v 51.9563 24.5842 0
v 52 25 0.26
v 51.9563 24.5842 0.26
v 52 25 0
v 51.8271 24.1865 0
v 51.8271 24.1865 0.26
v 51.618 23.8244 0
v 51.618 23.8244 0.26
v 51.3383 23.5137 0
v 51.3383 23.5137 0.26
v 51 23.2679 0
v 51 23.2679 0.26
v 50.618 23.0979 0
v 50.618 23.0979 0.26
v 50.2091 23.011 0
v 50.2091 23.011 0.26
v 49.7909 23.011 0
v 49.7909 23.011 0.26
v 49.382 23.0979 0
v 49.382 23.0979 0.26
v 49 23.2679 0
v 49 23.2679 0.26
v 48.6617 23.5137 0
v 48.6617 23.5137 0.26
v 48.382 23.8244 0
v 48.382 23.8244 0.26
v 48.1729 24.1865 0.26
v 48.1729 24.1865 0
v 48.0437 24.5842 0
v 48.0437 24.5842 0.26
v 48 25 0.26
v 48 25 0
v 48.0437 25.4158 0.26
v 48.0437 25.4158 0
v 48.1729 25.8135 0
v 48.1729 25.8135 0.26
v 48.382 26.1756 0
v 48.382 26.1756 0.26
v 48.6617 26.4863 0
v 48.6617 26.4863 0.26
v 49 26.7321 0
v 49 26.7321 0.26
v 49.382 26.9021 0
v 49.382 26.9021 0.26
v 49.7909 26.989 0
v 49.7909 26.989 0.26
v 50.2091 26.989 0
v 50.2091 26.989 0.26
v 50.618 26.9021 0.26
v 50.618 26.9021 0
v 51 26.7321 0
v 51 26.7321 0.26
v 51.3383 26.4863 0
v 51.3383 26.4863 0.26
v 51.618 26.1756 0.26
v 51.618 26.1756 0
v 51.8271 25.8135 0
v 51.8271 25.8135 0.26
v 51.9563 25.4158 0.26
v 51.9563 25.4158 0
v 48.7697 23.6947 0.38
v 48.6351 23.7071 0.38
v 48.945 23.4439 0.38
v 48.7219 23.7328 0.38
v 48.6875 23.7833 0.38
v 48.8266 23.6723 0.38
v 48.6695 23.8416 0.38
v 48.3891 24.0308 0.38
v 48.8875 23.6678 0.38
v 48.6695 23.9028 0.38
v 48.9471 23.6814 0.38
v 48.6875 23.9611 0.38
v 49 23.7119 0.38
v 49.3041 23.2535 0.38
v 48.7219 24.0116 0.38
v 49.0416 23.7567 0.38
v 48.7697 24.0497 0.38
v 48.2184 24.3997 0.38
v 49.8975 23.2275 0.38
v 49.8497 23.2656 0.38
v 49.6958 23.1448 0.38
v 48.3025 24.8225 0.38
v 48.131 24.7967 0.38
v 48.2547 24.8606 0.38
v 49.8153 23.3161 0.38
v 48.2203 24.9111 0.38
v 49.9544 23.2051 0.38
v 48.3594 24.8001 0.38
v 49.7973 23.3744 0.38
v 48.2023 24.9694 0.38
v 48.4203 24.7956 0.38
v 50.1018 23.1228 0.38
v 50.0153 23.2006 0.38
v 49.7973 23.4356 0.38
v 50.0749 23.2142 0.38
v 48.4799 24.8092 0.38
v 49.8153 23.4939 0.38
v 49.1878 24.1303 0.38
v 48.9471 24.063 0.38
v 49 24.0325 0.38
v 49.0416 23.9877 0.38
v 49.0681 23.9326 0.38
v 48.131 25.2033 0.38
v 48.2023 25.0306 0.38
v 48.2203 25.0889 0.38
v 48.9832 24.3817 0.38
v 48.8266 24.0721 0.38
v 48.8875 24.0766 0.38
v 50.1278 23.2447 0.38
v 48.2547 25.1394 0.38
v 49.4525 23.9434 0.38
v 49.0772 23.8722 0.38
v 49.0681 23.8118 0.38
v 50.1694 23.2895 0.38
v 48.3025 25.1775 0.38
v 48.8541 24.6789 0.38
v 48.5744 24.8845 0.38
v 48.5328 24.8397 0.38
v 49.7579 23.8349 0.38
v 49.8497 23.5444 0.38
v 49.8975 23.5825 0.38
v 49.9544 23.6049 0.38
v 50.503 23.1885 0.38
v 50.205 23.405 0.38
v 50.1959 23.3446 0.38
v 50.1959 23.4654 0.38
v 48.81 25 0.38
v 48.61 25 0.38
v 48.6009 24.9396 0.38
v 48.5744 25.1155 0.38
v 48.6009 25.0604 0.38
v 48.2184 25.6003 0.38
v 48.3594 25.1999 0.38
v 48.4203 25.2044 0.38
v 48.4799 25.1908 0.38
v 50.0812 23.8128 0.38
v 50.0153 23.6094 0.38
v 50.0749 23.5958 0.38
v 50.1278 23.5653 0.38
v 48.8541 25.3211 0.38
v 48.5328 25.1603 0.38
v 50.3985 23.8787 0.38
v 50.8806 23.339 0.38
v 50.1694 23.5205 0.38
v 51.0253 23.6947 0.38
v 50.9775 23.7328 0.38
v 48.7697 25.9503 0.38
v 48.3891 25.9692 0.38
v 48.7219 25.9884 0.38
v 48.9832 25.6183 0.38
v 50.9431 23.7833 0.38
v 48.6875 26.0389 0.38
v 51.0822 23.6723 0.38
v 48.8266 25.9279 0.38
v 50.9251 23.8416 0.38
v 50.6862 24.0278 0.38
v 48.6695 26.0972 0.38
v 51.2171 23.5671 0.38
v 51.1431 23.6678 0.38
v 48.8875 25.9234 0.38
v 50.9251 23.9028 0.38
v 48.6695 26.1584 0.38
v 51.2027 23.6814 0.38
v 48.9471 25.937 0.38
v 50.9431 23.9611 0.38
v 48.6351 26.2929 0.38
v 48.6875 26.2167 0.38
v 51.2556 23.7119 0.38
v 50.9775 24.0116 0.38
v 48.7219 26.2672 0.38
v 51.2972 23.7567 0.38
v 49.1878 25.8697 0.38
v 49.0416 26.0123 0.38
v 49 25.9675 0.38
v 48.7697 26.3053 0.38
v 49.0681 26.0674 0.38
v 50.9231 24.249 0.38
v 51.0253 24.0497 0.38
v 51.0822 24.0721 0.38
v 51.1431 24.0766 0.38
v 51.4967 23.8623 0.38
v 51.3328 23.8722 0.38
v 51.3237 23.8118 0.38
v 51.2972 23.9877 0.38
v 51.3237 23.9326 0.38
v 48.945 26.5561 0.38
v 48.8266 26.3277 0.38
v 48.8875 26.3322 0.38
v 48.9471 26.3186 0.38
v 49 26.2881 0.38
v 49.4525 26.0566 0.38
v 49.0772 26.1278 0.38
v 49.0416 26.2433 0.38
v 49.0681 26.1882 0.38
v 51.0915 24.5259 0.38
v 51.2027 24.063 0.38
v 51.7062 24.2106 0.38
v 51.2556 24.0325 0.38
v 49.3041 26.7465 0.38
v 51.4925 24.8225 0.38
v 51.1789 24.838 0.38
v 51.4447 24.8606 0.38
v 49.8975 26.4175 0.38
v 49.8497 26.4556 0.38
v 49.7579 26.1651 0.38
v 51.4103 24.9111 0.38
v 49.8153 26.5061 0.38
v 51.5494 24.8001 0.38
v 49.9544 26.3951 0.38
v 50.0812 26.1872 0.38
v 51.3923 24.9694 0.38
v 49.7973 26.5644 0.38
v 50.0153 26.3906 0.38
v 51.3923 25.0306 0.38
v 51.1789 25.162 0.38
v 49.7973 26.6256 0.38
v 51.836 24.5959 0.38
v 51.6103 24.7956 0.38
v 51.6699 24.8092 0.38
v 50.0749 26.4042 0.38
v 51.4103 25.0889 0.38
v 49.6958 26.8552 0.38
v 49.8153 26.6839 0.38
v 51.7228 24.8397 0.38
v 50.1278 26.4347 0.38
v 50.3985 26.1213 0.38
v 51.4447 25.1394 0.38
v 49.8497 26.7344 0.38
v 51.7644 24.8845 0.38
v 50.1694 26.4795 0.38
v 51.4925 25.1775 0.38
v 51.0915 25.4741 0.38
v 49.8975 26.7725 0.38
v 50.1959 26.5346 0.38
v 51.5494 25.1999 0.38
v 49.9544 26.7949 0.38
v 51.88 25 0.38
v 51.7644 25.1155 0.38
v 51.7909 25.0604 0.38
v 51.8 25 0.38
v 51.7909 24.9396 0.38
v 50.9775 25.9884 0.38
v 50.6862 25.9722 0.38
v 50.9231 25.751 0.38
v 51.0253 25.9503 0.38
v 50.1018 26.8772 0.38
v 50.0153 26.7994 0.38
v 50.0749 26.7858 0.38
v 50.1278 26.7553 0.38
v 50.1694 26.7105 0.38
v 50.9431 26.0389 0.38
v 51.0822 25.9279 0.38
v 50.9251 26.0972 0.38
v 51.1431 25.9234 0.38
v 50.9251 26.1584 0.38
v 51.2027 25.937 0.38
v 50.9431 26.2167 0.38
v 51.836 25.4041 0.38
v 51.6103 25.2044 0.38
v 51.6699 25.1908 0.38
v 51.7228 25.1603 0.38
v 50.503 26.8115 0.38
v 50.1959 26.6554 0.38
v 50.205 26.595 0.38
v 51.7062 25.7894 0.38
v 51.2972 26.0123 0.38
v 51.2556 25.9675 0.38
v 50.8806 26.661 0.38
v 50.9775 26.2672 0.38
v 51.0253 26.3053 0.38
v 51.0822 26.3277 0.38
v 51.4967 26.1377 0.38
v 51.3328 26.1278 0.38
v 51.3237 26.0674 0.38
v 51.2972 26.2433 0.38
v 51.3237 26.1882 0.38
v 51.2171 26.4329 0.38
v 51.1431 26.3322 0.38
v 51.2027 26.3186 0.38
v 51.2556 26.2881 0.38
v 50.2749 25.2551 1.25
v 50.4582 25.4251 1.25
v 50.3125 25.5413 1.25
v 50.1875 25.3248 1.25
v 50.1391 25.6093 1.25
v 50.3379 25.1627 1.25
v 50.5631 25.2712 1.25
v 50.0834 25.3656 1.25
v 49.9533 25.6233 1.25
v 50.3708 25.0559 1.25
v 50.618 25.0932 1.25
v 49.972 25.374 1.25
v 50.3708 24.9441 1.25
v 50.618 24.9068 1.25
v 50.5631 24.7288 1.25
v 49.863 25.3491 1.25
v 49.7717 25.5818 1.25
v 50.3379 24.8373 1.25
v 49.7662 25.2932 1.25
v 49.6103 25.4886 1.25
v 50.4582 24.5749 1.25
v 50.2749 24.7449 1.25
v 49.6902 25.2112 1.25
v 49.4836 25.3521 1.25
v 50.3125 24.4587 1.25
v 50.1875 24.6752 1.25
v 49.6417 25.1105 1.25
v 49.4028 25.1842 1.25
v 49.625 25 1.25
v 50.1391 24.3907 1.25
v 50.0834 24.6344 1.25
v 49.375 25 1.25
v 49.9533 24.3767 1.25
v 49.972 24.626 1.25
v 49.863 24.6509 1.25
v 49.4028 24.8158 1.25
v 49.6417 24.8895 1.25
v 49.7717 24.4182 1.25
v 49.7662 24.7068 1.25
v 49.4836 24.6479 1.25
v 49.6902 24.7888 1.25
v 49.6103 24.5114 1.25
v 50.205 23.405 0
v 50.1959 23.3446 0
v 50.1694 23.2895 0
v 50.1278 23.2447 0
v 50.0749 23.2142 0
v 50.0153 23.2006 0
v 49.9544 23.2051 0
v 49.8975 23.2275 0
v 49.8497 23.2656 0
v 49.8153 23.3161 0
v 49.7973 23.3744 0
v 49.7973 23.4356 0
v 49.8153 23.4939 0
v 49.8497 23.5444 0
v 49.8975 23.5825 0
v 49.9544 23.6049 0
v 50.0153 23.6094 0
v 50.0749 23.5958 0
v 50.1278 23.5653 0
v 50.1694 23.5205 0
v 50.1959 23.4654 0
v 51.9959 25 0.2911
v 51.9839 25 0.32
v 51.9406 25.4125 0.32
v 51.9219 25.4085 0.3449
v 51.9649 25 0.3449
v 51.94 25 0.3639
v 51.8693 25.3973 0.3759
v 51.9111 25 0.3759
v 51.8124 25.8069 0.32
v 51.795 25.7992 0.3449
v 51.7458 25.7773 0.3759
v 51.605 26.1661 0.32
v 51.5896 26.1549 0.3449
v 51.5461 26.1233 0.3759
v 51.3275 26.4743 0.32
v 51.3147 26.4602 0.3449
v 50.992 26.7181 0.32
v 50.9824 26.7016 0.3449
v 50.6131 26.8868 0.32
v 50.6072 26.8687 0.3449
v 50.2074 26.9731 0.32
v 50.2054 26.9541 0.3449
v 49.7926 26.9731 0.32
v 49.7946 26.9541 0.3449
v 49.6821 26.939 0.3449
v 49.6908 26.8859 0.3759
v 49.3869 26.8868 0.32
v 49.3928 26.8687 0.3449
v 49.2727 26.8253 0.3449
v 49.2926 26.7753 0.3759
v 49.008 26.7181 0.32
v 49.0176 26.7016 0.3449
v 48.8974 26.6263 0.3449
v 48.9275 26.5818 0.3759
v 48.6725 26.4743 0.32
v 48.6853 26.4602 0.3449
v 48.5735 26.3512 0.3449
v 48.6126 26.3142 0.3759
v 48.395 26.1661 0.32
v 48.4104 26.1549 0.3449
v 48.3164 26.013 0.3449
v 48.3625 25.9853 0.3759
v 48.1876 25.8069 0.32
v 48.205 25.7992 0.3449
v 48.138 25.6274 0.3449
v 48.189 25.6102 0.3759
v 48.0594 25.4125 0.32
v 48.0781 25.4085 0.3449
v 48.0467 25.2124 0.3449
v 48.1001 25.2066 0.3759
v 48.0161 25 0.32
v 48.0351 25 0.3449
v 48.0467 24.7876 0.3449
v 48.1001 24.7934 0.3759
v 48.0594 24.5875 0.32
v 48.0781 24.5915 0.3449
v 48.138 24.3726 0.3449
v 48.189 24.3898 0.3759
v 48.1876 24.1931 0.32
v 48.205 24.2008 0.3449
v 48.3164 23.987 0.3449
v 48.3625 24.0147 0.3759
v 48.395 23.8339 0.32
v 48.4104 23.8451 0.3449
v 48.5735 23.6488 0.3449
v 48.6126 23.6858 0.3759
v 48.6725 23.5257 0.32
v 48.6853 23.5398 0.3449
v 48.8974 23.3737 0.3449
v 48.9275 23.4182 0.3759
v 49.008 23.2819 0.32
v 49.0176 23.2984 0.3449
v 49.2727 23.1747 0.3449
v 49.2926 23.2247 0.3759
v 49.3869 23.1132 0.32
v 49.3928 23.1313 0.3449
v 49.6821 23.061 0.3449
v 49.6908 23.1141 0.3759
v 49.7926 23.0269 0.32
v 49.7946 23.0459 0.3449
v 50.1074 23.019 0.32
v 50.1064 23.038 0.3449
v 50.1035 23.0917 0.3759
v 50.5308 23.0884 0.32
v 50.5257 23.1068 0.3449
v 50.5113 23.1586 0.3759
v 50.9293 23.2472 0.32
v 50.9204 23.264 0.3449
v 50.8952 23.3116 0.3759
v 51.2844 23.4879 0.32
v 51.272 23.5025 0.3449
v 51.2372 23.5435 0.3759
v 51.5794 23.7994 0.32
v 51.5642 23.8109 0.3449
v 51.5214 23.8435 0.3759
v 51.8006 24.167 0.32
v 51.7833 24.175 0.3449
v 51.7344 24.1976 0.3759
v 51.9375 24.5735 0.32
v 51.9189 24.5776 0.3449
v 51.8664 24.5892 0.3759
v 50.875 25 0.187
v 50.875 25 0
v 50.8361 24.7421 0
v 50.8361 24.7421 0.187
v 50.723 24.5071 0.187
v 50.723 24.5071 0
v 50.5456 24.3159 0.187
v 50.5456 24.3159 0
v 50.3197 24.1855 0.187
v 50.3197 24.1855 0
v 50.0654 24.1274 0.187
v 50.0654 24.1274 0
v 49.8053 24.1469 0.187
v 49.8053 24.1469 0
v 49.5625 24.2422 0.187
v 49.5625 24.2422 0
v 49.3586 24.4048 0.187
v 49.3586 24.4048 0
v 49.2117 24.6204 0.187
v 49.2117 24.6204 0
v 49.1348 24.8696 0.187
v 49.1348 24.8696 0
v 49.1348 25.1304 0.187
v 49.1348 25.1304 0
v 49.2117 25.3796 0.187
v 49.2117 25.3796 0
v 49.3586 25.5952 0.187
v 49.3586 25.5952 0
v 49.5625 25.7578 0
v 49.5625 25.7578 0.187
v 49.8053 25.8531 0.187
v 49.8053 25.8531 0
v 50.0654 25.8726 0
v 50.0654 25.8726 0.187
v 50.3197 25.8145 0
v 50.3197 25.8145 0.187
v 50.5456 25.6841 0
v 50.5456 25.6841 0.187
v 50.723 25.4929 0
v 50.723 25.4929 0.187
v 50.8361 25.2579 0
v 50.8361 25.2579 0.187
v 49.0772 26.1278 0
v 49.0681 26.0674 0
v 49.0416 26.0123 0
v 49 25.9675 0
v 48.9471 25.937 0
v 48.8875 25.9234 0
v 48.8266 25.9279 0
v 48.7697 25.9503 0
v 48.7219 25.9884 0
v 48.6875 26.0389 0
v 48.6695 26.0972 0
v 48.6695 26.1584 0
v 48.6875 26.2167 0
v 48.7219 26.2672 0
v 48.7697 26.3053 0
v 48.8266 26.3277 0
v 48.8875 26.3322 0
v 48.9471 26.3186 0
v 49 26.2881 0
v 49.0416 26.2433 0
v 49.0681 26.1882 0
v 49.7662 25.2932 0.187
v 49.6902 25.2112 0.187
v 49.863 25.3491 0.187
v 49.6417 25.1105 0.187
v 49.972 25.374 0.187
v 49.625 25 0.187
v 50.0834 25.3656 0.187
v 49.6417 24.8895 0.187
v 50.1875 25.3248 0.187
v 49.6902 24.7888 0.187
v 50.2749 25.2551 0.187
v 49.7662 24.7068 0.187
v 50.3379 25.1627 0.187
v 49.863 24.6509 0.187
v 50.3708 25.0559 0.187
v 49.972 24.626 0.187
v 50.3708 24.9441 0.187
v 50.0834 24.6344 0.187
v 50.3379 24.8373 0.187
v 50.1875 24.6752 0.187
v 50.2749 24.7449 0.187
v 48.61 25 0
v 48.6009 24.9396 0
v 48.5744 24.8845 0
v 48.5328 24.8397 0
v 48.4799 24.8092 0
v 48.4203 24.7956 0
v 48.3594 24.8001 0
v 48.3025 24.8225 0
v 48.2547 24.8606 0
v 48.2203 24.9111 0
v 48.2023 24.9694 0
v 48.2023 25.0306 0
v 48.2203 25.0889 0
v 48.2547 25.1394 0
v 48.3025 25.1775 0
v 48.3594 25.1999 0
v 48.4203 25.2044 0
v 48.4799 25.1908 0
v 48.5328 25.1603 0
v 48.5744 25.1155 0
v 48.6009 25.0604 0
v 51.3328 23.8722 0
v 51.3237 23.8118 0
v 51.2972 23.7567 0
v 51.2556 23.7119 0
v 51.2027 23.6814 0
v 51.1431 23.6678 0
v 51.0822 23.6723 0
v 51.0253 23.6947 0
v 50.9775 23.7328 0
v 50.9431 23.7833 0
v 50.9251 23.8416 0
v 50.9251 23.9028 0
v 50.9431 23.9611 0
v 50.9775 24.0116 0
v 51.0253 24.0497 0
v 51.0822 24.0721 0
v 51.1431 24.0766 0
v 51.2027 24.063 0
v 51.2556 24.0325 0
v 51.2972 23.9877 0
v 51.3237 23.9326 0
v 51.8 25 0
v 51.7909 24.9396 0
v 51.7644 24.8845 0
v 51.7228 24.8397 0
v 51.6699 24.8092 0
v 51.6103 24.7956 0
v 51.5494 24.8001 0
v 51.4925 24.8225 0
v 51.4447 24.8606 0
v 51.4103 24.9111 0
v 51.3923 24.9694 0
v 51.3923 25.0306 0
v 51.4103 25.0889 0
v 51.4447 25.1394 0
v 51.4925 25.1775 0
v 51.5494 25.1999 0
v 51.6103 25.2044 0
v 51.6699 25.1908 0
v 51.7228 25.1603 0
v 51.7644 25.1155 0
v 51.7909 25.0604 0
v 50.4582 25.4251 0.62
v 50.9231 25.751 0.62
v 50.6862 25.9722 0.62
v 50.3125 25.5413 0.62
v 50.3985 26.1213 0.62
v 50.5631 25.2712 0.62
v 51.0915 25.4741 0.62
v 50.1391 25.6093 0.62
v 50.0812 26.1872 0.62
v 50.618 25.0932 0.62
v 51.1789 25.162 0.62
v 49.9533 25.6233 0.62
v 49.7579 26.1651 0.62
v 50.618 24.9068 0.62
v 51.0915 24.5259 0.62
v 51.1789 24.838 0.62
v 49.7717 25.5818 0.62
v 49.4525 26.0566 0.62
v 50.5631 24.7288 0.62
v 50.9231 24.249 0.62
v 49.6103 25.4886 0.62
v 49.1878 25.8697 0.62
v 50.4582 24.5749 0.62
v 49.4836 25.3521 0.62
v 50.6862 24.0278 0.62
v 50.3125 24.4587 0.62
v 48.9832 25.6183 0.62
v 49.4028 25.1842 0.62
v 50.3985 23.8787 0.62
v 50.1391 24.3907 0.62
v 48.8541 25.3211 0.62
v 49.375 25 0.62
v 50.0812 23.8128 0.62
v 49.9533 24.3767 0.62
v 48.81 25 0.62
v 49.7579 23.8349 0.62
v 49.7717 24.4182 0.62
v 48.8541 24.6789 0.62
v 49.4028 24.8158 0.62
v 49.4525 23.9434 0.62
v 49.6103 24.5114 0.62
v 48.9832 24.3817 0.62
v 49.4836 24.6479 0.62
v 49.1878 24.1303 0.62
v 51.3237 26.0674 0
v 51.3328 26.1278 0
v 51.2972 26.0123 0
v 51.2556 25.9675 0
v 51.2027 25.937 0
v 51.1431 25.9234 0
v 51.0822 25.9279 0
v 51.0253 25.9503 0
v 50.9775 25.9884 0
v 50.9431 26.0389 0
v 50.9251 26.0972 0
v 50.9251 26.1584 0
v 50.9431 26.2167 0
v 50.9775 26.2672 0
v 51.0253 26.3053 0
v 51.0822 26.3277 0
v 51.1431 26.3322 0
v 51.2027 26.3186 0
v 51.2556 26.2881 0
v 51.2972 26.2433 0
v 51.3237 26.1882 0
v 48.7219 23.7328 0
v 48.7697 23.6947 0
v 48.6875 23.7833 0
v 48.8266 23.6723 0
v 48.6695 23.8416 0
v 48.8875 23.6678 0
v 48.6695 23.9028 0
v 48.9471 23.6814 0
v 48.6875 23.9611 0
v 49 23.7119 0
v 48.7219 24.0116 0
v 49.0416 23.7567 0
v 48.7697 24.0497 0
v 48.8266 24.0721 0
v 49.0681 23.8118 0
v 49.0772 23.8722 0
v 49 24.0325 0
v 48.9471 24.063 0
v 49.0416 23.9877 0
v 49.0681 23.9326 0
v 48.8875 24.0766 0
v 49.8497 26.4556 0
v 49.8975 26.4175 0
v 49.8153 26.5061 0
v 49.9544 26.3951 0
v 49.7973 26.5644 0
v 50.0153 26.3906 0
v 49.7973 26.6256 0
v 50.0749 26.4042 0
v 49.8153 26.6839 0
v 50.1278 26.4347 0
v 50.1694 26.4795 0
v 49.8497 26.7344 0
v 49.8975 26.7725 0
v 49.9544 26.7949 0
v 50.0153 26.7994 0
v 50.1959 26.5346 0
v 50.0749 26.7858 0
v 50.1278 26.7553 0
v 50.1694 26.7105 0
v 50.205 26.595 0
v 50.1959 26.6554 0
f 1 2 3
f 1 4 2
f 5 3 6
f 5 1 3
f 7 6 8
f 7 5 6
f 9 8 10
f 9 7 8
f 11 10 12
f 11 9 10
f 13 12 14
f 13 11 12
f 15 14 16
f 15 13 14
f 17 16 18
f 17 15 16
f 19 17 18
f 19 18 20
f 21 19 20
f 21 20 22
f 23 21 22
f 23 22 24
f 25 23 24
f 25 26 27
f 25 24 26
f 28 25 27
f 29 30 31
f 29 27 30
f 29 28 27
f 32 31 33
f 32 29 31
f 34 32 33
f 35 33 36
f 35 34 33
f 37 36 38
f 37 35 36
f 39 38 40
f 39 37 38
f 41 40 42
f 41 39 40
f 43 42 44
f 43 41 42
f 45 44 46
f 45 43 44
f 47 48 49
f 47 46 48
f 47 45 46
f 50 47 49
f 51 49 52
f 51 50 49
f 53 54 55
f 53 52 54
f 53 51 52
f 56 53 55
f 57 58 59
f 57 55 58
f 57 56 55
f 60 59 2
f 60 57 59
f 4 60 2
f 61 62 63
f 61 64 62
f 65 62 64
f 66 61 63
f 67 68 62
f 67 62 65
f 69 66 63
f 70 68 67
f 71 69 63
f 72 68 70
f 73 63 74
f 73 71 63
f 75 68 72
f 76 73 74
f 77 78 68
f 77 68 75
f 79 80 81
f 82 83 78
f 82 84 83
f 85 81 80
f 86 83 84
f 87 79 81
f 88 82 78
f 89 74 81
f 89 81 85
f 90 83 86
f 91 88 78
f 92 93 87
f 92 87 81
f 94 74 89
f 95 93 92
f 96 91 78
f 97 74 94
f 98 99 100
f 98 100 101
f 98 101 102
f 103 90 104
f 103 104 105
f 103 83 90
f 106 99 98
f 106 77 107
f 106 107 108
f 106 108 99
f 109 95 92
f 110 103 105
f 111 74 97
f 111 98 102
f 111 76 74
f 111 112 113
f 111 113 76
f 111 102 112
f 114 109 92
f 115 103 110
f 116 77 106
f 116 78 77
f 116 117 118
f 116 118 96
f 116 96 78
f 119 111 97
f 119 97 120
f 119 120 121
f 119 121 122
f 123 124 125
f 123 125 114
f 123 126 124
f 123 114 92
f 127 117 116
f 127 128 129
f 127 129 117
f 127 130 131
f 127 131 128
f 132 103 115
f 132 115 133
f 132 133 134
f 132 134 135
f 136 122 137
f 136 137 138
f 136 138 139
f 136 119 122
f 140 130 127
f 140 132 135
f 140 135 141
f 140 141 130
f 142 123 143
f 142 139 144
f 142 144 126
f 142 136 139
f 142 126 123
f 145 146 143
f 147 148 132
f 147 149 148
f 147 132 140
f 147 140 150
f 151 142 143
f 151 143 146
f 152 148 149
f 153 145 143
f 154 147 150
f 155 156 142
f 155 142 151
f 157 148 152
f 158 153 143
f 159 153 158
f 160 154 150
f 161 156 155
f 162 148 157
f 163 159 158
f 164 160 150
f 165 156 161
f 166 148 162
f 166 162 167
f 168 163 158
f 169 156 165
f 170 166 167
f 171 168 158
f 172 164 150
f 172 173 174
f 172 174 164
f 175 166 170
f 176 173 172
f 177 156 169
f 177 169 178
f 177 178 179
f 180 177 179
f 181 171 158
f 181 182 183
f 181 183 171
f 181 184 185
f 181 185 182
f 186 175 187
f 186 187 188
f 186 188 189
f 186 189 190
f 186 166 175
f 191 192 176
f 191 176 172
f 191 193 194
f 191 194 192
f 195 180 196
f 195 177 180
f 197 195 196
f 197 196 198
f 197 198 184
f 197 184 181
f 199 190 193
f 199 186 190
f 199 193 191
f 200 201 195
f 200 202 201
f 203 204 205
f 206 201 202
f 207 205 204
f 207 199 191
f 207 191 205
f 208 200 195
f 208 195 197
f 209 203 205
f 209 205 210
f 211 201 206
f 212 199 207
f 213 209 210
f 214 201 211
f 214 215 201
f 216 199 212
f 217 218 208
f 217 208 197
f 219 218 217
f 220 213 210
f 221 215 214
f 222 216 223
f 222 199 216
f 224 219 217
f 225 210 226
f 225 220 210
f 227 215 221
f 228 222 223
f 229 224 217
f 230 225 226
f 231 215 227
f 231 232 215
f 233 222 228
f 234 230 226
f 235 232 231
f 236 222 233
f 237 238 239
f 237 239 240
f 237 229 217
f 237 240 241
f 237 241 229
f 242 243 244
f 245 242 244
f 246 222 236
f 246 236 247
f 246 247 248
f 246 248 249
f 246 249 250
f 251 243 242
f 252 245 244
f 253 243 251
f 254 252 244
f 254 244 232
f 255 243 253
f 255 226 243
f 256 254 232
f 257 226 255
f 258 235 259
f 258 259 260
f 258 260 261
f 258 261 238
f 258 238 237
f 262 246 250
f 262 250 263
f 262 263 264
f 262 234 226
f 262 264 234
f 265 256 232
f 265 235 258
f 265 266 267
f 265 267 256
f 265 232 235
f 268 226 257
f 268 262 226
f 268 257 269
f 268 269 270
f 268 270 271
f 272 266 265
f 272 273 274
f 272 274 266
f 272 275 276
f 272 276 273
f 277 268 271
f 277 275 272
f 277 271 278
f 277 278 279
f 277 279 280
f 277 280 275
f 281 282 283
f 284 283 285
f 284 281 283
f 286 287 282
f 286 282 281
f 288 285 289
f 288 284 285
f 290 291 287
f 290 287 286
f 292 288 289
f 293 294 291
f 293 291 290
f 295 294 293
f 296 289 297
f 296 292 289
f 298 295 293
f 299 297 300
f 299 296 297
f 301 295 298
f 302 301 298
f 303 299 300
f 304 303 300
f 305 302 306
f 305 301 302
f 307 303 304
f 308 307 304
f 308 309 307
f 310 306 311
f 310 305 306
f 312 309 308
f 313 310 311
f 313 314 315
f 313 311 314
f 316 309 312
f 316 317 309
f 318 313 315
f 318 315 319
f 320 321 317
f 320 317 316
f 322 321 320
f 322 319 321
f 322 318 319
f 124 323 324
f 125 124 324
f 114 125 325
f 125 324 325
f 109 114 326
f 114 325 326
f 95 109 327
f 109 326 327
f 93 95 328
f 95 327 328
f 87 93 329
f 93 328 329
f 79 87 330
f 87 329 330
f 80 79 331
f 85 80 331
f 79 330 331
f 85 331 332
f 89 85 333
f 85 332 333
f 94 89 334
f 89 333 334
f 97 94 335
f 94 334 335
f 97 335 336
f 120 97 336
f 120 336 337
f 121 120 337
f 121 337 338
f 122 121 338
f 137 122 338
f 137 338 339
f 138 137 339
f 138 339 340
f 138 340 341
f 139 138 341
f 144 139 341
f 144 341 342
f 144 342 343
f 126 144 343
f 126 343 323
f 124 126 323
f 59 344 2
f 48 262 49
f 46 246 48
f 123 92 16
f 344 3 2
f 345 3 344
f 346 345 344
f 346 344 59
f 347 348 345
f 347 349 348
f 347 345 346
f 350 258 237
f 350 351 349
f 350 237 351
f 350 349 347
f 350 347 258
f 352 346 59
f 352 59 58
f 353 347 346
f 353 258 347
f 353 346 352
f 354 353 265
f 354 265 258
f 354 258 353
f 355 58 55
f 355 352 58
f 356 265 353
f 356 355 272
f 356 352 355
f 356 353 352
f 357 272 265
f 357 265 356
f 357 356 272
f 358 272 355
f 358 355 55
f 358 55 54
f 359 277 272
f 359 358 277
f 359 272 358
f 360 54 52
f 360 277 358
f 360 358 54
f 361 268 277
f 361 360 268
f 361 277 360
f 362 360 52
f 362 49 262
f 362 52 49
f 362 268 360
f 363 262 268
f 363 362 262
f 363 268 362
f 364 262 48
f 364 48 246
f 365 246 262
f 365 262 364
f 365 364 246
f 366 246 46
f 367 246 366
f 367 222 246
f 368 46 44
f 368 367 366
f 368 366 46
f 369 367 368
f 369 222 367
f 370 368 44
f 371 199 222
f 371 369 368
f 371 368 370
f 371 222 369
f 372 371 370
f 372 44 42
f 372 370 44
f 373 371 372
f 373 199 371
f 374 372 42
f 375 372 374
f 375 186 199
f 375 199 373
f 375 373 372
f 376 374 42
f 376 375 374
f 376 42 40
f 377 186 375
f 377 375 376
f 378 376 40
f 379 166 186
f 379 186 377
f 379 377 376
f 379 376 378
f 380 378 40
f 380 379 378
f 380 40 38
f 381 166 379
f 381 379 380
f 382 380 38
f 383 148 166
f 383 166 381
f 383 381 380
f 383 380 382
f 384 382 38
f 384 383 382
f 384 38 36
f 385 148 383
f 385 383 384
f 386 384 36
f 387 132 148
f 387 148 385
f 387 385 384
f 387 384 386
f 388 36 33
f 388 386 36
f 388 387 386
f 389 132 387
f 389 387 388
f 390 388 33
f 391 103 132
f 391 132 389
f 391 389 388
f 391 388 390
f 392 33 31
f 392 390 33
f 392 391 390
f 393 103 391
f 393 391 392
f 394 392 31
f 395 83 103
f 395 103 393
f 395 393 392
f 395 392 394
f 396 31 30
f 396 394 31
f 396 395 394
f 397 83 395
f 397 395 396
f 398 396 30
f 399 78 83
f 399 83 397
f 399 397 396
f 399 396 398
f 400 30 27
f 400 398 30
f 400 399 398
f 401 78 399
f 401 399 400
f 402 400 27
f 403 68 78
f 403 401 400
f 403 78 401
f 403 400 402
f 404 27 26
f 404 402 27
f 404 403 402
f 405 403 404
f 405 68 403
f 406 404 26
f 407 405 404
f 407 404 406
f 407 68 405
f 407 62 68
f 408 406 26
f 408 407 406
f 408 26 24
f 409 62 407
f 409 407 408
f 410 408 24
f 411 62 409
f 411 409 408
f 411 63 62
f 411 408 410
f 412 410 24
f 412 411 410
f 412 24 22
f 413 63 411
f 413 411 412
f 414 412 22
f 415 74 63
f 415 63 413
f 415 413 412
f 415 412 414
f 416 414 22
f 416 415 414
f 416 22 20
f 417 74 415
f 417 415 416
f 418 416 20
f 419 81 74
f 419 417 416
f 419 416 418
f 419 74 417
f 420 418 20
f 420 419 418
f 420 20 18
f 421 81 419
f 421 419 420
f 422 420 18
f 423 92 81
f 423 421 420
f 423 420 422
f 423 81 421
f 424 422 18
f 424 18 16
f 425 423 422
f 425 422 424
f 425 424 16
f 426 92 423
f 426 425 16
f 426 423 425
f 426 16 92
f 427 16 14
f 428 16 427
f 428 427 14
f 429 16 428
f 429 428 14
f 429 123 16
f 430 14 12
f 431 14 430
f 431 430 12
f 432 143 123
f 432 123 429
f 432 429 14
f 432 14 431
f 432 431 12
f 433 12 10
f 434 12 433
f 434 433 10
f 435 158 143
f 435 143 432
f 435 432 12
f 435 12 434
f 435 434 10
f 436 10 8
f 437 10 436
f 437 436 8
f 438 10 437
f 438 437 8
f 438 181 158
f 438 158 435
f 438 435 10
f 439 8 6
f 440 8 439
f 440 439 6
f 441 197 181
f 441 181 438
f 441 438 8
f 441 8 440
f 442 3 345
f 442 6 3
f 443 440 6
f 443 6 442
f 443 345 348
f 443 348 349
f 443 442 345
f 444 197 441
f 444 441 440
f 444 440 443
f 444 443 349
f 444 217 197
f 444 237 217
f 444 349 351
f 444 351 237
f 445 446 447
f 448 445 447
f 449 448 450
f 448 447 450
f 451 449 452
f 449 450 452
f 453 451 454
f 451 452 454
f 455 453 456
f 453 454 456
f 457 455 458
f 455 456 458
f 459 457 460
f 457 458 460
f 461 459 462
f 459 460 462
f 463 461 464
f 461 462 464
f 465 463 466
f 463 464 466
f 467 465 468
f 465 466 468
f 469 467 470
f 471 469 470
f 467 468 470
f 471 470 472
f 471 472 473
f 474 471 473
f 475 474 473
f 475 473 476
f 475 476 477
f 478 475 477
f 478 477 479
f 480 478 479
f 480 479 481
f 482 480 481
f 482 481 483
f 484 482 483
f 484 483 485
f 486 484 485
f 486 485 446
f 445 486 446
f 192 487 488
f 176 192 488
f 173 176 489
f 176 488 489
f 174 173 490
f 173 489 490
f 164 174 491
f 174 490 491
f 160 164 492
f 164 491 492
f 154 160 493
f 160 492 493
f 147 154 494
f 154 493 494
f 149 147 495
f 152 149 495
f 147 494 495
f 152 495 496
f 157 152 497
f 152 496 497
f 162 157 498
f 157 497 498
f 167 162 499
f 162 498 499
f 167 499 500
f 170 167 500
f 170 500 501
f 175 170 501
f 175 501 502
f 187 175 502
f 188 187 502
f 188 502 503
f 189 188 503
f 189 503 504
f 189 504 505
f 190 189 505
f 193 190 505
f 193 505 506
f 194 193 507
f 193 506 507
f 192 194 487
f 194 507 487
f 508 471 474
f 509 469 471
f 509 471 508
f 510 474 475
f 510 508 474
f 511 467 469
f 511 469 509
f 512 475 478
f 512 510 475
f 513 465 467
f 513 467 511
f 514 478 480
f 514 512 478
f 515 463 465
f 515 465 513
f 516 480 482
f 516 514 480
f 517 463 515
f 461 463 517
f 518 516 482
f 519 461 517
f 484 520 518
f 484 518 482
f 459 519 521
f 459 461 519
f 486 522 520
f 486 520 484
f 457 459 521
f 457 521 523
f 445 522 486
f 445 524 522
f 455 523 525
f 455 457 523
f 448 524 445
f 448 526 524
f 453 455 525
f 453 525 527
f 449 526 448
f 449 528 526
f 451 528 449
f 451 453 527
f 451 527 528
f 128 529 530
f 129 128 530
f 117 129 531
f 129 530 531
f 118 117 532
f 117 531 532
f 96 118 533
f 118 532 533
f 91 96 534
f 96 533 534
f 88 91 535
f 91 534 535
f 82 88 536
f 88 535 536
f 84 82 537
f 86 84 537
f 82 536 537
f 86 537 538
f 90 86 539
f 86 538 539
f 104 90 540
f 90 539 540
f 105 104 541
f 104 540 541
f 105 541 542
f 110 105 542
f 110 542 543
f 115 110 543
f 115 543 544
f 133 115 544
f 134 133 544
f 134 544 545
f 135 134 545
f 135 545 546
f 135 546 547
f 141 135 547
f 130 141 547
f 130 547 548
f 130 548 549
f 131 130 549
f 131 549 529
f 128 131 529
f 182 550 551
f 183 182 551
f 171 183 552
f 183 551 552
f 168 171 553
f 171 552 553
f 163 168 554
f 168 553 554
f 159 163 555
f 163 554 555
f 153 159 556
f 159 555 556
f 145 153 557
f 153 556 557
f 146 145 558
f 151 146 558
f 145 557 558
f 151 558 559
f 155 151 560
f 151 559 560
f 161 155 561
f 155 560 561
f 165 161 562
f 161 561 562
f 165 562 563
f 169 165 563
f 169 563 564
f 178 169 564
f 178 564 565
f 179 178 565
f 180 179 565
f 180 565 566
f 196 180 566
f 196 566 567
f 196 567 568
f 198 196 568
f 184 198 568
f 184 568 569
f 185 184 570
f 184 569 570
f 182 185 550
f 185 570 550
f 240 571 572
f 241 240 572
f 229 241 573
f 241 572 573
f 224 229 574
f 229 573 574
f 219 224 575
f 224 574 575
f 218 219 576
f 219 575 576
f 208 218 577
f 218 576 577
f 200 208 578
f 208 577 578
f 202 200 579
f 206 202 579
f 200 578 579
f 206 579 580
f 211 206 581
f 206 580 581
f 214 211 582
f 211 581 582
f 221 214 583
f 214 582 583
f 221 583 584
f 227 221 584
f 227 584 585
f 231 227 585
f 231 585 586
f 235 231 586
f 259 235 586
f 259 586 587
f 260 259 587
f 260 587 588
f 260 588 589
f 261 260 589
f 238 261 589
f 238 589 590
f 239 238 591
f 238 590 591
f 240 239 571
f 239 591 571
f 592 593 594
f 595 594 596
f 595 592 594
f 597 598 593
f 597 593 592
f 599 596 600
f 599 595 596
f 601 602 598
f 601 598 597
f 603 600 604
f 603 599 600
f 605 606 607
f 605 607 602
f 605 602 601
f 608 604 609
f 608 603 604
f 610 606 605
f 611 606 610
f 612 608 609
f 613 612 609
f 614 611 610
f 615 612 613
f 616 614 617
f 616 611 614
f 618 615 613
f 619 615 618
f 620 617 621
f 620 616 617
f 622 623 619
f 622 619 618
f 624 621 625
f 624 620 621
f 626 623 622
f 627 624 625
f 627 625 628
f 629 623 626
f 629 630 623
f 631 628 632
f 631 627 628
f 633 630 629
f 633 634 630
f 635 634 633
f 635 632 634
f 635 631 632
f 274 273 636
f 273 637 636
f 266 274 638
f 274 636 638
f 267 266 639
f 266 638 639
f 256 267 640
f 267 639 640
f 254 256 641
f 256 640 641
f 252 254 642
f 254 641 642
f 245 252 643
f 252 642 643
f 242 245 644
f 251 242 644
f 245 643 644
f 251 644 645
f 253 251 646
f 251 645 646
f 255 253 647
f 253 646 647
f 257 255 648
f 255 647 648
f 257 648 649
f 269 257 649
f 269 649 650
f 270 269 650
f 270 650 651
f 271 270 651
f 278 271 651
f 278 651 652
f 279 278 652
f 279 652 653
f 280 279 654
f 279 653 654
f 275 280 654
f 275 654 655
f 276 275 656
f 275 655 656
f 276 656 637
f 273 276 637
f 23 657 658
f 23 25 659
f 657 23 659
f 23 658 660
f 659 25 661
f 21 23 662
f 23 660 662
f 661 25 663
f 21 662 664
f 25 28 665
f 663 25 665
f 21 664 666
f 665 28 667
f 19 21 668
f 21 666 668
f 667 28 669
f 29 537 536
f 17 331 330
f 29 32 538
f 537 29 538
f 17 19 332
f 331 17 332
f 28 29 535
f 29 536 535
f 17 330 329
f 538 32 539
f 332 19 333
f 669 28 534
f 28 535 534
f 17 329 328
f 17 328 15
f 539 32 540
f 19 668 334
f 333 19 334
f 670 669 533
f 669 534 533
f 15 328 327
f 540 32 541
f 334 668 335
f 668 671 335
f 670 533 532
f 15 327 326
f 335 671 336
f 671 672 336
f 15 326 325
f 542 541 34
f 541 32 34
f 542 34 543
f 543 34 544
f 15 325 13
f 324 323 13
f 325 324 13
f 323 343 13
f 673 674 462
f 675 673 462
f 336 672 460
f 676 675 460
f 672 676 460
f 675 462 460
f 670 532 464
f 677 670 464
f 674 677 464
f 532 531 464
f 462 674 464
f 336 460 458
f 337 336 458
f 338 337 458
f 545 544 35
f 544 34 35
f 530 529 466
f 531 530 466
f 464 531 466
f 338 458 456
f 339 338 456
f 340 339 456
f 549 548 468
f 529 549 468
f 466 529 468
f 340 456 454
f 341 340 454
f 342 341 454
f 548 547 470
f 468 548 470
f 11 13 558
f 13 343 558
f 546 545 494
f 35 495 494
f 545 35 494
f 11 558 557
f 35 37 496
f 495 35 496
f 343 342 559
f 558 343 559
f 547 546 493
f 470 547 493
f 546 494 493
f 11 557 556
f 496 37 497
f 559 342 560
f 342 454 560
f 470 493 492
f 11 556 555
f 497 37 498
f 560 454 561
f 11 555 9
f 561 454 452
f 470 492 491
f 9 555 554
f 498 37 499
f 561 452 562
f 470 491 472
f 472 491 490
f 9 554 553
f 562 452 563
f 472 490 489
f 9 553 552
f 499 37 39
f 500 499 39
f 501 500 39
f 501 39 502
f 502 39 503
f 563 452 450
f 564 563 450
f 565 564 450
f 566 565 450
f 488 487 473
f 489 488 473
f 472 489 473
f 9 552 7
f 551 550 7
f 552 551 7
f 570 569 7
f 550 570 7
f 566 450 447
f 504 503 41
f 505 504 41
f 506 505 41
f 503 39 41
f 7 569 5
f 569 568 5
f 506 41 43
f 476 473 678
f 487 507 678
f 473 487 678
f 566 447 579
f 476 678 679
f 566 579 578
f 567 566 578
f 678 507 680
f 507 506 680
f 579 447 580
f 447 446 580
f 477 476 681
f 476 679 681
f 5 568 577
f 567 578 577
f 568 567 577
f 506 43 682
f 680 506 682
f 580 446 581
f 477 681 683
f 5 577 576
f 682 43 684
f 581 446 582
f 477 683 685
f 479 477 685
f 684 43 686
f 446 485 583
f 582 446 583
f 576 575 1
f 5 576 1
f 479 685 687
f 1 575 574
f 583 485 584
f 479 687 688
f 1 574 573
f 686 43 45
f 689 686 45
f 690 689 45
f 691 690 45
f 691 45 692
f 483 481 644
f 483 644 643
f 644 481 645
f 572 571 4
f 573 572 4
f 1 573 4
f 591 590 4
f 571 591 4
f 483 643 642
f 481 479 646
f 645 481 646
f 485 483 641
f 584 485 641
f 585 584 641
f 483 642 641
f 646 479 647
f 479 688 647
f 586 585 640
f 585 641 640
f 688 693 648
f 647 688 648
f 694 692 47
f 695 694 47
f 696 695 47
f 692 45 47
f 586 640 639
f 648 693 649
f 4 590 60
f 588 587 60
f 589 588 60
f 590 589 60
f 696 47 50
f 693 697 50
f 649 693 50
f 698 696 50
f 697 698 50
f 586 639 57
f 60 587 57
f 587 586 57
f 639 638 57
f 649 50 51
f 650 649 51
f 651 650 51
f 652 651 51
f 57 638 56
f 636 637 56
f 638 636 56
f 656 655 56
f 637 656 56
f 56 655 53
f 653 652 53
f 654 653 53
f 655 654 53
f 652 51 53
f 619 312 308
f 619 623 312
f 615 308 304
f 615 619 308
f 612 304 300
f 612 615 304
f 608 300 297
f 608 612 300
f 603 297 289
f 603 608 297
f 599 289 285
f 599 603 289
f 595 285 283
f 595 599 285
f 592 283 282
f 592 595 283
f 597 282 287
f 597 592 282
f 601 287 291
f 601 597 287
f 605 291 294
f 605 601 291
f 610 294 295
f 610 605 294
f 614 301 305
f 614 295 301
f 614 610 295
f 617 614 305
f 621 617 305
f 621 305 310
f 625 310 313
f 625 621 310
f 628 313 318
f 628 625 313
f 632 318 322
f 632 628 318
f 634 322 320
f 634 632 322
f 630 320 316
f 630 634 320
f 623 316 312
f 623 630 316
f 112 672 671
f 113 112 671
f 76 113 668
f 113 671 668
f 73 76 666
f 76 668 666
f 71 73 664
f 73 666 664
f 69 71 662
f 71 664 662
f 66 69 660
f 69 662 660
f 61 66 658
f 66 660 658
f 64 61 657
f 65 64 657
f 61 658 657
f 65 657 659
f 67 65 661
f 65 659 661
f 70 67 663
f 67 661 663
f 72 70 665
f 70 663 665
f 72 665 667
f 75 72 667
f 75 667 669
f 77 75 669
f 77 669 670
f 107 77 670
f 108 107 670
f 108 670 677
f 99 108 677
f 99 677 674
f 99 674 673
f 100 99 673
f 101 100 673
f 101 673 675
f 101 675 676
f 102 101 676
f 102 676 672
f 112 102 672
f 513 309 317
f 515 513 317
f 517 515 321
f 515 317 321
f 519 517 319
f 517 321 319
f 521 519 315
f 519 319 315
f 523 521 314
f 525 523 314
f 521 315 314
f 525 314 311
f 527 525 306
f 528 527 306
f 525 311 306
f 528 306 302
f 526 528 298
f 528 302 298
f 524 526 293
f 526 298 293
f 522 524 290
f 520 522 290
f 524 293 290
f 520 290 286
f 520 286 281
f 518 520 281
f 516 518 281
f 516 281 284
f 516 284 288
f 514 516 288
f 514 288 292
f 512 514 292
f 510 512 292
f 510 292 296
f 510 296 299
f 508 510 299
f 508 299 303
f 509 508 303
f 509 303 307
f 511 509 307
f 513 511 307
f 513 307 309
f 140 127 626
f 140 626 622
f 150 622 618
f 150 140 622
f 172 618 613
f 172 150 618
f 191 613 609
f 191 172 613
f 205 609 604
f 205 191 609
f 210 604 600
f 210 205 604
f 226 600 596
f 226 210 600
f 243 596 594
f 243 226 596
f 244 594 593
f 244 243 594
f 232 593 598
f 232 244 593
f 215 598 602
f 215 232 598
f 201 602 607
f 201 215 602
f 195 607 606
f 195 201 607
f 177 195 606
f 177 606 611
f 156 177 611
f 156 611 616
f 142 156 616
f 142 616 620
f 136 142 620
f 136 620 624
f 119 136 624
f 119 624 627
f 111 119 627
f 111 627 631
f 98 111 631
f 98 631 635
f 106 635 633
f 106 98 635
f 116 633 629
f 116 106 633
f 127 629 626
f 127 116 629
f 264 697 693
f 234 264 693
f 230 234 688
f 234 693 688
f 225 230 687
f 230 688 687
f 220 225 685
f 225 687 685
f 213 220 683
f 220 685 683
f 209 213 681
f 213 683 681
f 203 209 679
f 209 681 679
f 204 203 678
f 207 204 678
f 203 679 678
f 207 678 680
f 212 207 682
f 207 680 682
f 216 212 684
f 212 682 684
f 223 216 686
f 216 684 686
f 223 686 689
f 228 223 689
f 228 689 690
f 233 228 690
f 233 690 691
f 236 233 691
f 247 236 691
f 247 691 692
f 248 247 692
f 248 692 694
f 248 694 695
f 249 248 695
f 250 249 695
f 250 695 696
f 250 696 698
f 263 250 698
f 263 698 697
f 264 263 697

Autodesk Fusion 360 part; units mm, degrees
sketch "Sketch1" plane through (0, 0, 0) normal (0, 0, 1) x (1, 0, 0)
  circle A0 centre (50, 25) radius 2
extrude "Extrude1" add sketch "Sketch1" along normal blind 0.38
fillet "Fillet1" radius 0.12 1 edges at (48.1353, 24.2768, 0.38)
sketch "Sketch2" plane through (0, 0, 0.38) normal (0, 0, 1) x (-1, 0, 0)
  circle A0 centre (-50, -25) radius 1.88
  circle A1 centre (-50, -25) radius 1.19
  dimension "d4" = 2.38
extrude "Extrude2" add sketch "Sketch2" along normal blind 0.24 contours A1
sketch "Sketch3" plane through (0, 0, 0.62) normal (0, 0, 1) x (-1, 0, 0)
  circle A0 centre (-50, -25) radius 1.19
  circle A1 centre (-50, -25) radius 0.375
  dimension "d7" = 0.75
extrude "Extrude3" add sketch "Sketch3" along normal blind 0.63 contours A1
sketch "Sketch4" plane through (0, 0, 0) normal (0, 0, -1) x (1, 0, 0)
  circle A0 centre (50, -25) radius 2
  circle A1 centre (50, -25) radius 0.875
  dimension "d10" = 1.75
extrude "Extrude4" cut sketch "Sketch4" against normal blind 0.187 contours A1
sketch "Sketch5" plane through (0, 0, 0.62) normal (0, 0, 1) x (-1, 0, 0)
  circle A0 centre (-50, -25) radius 0.375
  circle A1 centre (-50, -25) radius 1.19
  circle A2 centre (-50, -25) radius 0.625
  dimension "d13" = 1.25
extrude "Extrude5" add sketch "Sketch5" along normal blind 0.63 contours A2
sketch "Sketch6" plane through (0, 0, 1.25) normal (0, 0, 1) x (-1, 0, 0)
  circle A0 centre (-50, -25) radius 0.625
  circle A1 centre (-50, -25) radius 0.375
  dimension "d16" = 0.75
extrude "Extrude6" cut sketch "Sketch6" against normal blind 1.063 contours A1
sketch "Sketch7" plane through (0, 0, 0) normal (0, 0, -1) x (1, 0, 0)
  circle A0 centre (50, -25) radius 0.875
  circle A1 centre (50, -25) radius 2
  line L0 (50, -25) -> (51.39, -25)
  circle A2 centre (51.595, -25) radius 0.205
  arc A3 (51.5818, -24.7954) -> (51.5818, -25.2046) centre (50, -25) ccw
  dimension "d19" = 3.19
  dimension "d20" = 1.595
  dimension "d21" = 0.41
extrude "Extrude7" cut sketch "Sketch7" against normal blind 0.38 contours A2
sketch "Sketch8" plane through (0, 0, 0) normal (0, 0, -1) x (1, 0, 0)
  circle A0 centre (51.595, -25) radius 0.205
  circle A1 centre (50, -25) radius 0.875
  circle A2 centre (50, -25) radius 2
  circle A3 centre (51.1278, -23.8722) radius 0.205
  dimension "d24" = 1.595
  dimension "d25" = 0.41
extrude "Extrude8" cut sketch "Sketch8" against normal blind 0.38 contours A3
sketch "Sketch9" plane through (0, 0, 0) normal (0, 0, -1) x (1, 0, 0)
  circle A0 centre (51.1278, -23.8722) radius 0.205
  circle A1 centre (51.595, -25) radius 0.205
  circle A2 centre (50, -25) radius 0.875
  circle A3 centre (50, -25) radius 2
  circle A4 centre (50, -23.405) radius 0.205
  dimension "d28" = 1.595
  dimension "d29" = 0.41
extrude "Extrude9" cut sketch "Sketch9" against normal blind 0.38 contours A4
sketch "Sketch10" plane through (0, 0, 0) normal (0, 0, -1) x (1, 0, 0)
  circle A0 centre (50, -23.405) radius 0.205
  circle A1 centre (51.1278, -23.8722) radius 0.205
  circle A2 centre (51.595, -25) radius 0.205
  circle A3 centre (50, -25) radius 0.875
  circle A4 centre (50, -25) radius 2
  line L0 (50, -25) -> (51.595, -25) construction
  circle A5 centre (48.8722, -23.8722) radius 0.205
  dimension "d33" = 1.595
  dimension "d34" = 0.41
extrude "Extrude10" cut sketch "Sketch10" against normal blind 0.38 contours A5
sketch "Sketch11" plane through (0, 0, 0) normal (0, 0, -1) x (1, 0, 0)
  circle A0 centre (48.8722, -23.8722) radius 0.205
  circle A1 centre (50, -23.405) radius 0.205
  circle A2 centre (51.1278, -23.8722) radius 0.205
  circle A3 centre (51.595, -25) radius 0.205
  circle A4 centre (50, -25) radius 0.875
  circle A5 centre (50, -25) radius 2
  circle A6 centre (48.405, -25) radius 0.205
  dimension "d37" = 1.595
  dimension "d38" = 0.41
extrude "Extrude11" cut sketch "Sketch11" against normal blind 0.38 contours A6
sketch "Sketch12" plane through (0, 0, 0) normal (0, 0, -1) x (1, 0, 0)
  circle A0 centre (48.405, -25) radius 0.205
  circle A1 centre (48.8722, -23.8722) radius 0.205
  circle A2 centre (50, -23.405) radius 0.205
  circle A3 centre (51.1278, -23.8722) radius 0.205
  circle A4 centre (51.595, -25) radius 0.205
  circle A5 centre (50, -25) radius 0.875
  circle A6 centre (50, -25) radius 2
  circle A7 centre (51.1278, -26.1278) radius 0.205
  dimension "d41" = 1.595
  dimension "d42" = 0.41
extrude "Extrude12" cut sketch "Sketch12" against normal blind 0.38 contours A7
sketch "Sketch13" plane through (0, 0, 0) normal (0, 0, -1) x (1, 0, 0)
  circle A0 centre (51.1278, -26.1278) radius 0.205
  circle A1 centre (48.405, -25) radius 0.205
  circle A2 centre (48.8722, -23.8722) radius 0.205
  circle A3 centre (50, -23.405) radius 0.205
  circle A4 centre (51.1278, -23.8722) radius 0.205
  circle A5 centre (51.595, -25) radius 0.205
  circle A6 centre (50, -25) radius 0.875
  circle A7 centre (50, -25) radius 2
  circle A8 centre (50, -26.595) radius 0.205
  dimension "d45" = 1.595
  dimension "d46" = 0.41
extrude "Extrude13" cut sketch "Sketch13" against normal blind 0.38 contours A8
sketch "Sketch14" plane through (0, 0, 0) normal (0, 0, -1) x (1, 0, 0)
  circle A0 centre (50, -26.595) radius 0.205
  circle A1 centre (51.1278, -26.1278) radius 0.205
  circle A2 centre (48.405, -25) radius 0.205
  circle A3 centre (48.8722, -23.8722) radius 0.205
  circle A4 centre (50, -23.405) radius 0.205
  circle A5 centre (51.1278, -23.8722) radius 0.205
  circle A6 centre (51.595, -25) radius 0.205
  circle A7 centre (50, -25) radius 0.875
  circle A8 centre (50, -25) radius 2
  line L0 (50, -25) -> (51.595, -25) construction
  circle A9 centre (48.8722, -26.1278) radius 0.205
  dimension "d50" = 1.595
  dimension "d51" = 0.41
extrude "Extrude14" cut sketch "Sketch14" against normal blind 0.38 contours A9
